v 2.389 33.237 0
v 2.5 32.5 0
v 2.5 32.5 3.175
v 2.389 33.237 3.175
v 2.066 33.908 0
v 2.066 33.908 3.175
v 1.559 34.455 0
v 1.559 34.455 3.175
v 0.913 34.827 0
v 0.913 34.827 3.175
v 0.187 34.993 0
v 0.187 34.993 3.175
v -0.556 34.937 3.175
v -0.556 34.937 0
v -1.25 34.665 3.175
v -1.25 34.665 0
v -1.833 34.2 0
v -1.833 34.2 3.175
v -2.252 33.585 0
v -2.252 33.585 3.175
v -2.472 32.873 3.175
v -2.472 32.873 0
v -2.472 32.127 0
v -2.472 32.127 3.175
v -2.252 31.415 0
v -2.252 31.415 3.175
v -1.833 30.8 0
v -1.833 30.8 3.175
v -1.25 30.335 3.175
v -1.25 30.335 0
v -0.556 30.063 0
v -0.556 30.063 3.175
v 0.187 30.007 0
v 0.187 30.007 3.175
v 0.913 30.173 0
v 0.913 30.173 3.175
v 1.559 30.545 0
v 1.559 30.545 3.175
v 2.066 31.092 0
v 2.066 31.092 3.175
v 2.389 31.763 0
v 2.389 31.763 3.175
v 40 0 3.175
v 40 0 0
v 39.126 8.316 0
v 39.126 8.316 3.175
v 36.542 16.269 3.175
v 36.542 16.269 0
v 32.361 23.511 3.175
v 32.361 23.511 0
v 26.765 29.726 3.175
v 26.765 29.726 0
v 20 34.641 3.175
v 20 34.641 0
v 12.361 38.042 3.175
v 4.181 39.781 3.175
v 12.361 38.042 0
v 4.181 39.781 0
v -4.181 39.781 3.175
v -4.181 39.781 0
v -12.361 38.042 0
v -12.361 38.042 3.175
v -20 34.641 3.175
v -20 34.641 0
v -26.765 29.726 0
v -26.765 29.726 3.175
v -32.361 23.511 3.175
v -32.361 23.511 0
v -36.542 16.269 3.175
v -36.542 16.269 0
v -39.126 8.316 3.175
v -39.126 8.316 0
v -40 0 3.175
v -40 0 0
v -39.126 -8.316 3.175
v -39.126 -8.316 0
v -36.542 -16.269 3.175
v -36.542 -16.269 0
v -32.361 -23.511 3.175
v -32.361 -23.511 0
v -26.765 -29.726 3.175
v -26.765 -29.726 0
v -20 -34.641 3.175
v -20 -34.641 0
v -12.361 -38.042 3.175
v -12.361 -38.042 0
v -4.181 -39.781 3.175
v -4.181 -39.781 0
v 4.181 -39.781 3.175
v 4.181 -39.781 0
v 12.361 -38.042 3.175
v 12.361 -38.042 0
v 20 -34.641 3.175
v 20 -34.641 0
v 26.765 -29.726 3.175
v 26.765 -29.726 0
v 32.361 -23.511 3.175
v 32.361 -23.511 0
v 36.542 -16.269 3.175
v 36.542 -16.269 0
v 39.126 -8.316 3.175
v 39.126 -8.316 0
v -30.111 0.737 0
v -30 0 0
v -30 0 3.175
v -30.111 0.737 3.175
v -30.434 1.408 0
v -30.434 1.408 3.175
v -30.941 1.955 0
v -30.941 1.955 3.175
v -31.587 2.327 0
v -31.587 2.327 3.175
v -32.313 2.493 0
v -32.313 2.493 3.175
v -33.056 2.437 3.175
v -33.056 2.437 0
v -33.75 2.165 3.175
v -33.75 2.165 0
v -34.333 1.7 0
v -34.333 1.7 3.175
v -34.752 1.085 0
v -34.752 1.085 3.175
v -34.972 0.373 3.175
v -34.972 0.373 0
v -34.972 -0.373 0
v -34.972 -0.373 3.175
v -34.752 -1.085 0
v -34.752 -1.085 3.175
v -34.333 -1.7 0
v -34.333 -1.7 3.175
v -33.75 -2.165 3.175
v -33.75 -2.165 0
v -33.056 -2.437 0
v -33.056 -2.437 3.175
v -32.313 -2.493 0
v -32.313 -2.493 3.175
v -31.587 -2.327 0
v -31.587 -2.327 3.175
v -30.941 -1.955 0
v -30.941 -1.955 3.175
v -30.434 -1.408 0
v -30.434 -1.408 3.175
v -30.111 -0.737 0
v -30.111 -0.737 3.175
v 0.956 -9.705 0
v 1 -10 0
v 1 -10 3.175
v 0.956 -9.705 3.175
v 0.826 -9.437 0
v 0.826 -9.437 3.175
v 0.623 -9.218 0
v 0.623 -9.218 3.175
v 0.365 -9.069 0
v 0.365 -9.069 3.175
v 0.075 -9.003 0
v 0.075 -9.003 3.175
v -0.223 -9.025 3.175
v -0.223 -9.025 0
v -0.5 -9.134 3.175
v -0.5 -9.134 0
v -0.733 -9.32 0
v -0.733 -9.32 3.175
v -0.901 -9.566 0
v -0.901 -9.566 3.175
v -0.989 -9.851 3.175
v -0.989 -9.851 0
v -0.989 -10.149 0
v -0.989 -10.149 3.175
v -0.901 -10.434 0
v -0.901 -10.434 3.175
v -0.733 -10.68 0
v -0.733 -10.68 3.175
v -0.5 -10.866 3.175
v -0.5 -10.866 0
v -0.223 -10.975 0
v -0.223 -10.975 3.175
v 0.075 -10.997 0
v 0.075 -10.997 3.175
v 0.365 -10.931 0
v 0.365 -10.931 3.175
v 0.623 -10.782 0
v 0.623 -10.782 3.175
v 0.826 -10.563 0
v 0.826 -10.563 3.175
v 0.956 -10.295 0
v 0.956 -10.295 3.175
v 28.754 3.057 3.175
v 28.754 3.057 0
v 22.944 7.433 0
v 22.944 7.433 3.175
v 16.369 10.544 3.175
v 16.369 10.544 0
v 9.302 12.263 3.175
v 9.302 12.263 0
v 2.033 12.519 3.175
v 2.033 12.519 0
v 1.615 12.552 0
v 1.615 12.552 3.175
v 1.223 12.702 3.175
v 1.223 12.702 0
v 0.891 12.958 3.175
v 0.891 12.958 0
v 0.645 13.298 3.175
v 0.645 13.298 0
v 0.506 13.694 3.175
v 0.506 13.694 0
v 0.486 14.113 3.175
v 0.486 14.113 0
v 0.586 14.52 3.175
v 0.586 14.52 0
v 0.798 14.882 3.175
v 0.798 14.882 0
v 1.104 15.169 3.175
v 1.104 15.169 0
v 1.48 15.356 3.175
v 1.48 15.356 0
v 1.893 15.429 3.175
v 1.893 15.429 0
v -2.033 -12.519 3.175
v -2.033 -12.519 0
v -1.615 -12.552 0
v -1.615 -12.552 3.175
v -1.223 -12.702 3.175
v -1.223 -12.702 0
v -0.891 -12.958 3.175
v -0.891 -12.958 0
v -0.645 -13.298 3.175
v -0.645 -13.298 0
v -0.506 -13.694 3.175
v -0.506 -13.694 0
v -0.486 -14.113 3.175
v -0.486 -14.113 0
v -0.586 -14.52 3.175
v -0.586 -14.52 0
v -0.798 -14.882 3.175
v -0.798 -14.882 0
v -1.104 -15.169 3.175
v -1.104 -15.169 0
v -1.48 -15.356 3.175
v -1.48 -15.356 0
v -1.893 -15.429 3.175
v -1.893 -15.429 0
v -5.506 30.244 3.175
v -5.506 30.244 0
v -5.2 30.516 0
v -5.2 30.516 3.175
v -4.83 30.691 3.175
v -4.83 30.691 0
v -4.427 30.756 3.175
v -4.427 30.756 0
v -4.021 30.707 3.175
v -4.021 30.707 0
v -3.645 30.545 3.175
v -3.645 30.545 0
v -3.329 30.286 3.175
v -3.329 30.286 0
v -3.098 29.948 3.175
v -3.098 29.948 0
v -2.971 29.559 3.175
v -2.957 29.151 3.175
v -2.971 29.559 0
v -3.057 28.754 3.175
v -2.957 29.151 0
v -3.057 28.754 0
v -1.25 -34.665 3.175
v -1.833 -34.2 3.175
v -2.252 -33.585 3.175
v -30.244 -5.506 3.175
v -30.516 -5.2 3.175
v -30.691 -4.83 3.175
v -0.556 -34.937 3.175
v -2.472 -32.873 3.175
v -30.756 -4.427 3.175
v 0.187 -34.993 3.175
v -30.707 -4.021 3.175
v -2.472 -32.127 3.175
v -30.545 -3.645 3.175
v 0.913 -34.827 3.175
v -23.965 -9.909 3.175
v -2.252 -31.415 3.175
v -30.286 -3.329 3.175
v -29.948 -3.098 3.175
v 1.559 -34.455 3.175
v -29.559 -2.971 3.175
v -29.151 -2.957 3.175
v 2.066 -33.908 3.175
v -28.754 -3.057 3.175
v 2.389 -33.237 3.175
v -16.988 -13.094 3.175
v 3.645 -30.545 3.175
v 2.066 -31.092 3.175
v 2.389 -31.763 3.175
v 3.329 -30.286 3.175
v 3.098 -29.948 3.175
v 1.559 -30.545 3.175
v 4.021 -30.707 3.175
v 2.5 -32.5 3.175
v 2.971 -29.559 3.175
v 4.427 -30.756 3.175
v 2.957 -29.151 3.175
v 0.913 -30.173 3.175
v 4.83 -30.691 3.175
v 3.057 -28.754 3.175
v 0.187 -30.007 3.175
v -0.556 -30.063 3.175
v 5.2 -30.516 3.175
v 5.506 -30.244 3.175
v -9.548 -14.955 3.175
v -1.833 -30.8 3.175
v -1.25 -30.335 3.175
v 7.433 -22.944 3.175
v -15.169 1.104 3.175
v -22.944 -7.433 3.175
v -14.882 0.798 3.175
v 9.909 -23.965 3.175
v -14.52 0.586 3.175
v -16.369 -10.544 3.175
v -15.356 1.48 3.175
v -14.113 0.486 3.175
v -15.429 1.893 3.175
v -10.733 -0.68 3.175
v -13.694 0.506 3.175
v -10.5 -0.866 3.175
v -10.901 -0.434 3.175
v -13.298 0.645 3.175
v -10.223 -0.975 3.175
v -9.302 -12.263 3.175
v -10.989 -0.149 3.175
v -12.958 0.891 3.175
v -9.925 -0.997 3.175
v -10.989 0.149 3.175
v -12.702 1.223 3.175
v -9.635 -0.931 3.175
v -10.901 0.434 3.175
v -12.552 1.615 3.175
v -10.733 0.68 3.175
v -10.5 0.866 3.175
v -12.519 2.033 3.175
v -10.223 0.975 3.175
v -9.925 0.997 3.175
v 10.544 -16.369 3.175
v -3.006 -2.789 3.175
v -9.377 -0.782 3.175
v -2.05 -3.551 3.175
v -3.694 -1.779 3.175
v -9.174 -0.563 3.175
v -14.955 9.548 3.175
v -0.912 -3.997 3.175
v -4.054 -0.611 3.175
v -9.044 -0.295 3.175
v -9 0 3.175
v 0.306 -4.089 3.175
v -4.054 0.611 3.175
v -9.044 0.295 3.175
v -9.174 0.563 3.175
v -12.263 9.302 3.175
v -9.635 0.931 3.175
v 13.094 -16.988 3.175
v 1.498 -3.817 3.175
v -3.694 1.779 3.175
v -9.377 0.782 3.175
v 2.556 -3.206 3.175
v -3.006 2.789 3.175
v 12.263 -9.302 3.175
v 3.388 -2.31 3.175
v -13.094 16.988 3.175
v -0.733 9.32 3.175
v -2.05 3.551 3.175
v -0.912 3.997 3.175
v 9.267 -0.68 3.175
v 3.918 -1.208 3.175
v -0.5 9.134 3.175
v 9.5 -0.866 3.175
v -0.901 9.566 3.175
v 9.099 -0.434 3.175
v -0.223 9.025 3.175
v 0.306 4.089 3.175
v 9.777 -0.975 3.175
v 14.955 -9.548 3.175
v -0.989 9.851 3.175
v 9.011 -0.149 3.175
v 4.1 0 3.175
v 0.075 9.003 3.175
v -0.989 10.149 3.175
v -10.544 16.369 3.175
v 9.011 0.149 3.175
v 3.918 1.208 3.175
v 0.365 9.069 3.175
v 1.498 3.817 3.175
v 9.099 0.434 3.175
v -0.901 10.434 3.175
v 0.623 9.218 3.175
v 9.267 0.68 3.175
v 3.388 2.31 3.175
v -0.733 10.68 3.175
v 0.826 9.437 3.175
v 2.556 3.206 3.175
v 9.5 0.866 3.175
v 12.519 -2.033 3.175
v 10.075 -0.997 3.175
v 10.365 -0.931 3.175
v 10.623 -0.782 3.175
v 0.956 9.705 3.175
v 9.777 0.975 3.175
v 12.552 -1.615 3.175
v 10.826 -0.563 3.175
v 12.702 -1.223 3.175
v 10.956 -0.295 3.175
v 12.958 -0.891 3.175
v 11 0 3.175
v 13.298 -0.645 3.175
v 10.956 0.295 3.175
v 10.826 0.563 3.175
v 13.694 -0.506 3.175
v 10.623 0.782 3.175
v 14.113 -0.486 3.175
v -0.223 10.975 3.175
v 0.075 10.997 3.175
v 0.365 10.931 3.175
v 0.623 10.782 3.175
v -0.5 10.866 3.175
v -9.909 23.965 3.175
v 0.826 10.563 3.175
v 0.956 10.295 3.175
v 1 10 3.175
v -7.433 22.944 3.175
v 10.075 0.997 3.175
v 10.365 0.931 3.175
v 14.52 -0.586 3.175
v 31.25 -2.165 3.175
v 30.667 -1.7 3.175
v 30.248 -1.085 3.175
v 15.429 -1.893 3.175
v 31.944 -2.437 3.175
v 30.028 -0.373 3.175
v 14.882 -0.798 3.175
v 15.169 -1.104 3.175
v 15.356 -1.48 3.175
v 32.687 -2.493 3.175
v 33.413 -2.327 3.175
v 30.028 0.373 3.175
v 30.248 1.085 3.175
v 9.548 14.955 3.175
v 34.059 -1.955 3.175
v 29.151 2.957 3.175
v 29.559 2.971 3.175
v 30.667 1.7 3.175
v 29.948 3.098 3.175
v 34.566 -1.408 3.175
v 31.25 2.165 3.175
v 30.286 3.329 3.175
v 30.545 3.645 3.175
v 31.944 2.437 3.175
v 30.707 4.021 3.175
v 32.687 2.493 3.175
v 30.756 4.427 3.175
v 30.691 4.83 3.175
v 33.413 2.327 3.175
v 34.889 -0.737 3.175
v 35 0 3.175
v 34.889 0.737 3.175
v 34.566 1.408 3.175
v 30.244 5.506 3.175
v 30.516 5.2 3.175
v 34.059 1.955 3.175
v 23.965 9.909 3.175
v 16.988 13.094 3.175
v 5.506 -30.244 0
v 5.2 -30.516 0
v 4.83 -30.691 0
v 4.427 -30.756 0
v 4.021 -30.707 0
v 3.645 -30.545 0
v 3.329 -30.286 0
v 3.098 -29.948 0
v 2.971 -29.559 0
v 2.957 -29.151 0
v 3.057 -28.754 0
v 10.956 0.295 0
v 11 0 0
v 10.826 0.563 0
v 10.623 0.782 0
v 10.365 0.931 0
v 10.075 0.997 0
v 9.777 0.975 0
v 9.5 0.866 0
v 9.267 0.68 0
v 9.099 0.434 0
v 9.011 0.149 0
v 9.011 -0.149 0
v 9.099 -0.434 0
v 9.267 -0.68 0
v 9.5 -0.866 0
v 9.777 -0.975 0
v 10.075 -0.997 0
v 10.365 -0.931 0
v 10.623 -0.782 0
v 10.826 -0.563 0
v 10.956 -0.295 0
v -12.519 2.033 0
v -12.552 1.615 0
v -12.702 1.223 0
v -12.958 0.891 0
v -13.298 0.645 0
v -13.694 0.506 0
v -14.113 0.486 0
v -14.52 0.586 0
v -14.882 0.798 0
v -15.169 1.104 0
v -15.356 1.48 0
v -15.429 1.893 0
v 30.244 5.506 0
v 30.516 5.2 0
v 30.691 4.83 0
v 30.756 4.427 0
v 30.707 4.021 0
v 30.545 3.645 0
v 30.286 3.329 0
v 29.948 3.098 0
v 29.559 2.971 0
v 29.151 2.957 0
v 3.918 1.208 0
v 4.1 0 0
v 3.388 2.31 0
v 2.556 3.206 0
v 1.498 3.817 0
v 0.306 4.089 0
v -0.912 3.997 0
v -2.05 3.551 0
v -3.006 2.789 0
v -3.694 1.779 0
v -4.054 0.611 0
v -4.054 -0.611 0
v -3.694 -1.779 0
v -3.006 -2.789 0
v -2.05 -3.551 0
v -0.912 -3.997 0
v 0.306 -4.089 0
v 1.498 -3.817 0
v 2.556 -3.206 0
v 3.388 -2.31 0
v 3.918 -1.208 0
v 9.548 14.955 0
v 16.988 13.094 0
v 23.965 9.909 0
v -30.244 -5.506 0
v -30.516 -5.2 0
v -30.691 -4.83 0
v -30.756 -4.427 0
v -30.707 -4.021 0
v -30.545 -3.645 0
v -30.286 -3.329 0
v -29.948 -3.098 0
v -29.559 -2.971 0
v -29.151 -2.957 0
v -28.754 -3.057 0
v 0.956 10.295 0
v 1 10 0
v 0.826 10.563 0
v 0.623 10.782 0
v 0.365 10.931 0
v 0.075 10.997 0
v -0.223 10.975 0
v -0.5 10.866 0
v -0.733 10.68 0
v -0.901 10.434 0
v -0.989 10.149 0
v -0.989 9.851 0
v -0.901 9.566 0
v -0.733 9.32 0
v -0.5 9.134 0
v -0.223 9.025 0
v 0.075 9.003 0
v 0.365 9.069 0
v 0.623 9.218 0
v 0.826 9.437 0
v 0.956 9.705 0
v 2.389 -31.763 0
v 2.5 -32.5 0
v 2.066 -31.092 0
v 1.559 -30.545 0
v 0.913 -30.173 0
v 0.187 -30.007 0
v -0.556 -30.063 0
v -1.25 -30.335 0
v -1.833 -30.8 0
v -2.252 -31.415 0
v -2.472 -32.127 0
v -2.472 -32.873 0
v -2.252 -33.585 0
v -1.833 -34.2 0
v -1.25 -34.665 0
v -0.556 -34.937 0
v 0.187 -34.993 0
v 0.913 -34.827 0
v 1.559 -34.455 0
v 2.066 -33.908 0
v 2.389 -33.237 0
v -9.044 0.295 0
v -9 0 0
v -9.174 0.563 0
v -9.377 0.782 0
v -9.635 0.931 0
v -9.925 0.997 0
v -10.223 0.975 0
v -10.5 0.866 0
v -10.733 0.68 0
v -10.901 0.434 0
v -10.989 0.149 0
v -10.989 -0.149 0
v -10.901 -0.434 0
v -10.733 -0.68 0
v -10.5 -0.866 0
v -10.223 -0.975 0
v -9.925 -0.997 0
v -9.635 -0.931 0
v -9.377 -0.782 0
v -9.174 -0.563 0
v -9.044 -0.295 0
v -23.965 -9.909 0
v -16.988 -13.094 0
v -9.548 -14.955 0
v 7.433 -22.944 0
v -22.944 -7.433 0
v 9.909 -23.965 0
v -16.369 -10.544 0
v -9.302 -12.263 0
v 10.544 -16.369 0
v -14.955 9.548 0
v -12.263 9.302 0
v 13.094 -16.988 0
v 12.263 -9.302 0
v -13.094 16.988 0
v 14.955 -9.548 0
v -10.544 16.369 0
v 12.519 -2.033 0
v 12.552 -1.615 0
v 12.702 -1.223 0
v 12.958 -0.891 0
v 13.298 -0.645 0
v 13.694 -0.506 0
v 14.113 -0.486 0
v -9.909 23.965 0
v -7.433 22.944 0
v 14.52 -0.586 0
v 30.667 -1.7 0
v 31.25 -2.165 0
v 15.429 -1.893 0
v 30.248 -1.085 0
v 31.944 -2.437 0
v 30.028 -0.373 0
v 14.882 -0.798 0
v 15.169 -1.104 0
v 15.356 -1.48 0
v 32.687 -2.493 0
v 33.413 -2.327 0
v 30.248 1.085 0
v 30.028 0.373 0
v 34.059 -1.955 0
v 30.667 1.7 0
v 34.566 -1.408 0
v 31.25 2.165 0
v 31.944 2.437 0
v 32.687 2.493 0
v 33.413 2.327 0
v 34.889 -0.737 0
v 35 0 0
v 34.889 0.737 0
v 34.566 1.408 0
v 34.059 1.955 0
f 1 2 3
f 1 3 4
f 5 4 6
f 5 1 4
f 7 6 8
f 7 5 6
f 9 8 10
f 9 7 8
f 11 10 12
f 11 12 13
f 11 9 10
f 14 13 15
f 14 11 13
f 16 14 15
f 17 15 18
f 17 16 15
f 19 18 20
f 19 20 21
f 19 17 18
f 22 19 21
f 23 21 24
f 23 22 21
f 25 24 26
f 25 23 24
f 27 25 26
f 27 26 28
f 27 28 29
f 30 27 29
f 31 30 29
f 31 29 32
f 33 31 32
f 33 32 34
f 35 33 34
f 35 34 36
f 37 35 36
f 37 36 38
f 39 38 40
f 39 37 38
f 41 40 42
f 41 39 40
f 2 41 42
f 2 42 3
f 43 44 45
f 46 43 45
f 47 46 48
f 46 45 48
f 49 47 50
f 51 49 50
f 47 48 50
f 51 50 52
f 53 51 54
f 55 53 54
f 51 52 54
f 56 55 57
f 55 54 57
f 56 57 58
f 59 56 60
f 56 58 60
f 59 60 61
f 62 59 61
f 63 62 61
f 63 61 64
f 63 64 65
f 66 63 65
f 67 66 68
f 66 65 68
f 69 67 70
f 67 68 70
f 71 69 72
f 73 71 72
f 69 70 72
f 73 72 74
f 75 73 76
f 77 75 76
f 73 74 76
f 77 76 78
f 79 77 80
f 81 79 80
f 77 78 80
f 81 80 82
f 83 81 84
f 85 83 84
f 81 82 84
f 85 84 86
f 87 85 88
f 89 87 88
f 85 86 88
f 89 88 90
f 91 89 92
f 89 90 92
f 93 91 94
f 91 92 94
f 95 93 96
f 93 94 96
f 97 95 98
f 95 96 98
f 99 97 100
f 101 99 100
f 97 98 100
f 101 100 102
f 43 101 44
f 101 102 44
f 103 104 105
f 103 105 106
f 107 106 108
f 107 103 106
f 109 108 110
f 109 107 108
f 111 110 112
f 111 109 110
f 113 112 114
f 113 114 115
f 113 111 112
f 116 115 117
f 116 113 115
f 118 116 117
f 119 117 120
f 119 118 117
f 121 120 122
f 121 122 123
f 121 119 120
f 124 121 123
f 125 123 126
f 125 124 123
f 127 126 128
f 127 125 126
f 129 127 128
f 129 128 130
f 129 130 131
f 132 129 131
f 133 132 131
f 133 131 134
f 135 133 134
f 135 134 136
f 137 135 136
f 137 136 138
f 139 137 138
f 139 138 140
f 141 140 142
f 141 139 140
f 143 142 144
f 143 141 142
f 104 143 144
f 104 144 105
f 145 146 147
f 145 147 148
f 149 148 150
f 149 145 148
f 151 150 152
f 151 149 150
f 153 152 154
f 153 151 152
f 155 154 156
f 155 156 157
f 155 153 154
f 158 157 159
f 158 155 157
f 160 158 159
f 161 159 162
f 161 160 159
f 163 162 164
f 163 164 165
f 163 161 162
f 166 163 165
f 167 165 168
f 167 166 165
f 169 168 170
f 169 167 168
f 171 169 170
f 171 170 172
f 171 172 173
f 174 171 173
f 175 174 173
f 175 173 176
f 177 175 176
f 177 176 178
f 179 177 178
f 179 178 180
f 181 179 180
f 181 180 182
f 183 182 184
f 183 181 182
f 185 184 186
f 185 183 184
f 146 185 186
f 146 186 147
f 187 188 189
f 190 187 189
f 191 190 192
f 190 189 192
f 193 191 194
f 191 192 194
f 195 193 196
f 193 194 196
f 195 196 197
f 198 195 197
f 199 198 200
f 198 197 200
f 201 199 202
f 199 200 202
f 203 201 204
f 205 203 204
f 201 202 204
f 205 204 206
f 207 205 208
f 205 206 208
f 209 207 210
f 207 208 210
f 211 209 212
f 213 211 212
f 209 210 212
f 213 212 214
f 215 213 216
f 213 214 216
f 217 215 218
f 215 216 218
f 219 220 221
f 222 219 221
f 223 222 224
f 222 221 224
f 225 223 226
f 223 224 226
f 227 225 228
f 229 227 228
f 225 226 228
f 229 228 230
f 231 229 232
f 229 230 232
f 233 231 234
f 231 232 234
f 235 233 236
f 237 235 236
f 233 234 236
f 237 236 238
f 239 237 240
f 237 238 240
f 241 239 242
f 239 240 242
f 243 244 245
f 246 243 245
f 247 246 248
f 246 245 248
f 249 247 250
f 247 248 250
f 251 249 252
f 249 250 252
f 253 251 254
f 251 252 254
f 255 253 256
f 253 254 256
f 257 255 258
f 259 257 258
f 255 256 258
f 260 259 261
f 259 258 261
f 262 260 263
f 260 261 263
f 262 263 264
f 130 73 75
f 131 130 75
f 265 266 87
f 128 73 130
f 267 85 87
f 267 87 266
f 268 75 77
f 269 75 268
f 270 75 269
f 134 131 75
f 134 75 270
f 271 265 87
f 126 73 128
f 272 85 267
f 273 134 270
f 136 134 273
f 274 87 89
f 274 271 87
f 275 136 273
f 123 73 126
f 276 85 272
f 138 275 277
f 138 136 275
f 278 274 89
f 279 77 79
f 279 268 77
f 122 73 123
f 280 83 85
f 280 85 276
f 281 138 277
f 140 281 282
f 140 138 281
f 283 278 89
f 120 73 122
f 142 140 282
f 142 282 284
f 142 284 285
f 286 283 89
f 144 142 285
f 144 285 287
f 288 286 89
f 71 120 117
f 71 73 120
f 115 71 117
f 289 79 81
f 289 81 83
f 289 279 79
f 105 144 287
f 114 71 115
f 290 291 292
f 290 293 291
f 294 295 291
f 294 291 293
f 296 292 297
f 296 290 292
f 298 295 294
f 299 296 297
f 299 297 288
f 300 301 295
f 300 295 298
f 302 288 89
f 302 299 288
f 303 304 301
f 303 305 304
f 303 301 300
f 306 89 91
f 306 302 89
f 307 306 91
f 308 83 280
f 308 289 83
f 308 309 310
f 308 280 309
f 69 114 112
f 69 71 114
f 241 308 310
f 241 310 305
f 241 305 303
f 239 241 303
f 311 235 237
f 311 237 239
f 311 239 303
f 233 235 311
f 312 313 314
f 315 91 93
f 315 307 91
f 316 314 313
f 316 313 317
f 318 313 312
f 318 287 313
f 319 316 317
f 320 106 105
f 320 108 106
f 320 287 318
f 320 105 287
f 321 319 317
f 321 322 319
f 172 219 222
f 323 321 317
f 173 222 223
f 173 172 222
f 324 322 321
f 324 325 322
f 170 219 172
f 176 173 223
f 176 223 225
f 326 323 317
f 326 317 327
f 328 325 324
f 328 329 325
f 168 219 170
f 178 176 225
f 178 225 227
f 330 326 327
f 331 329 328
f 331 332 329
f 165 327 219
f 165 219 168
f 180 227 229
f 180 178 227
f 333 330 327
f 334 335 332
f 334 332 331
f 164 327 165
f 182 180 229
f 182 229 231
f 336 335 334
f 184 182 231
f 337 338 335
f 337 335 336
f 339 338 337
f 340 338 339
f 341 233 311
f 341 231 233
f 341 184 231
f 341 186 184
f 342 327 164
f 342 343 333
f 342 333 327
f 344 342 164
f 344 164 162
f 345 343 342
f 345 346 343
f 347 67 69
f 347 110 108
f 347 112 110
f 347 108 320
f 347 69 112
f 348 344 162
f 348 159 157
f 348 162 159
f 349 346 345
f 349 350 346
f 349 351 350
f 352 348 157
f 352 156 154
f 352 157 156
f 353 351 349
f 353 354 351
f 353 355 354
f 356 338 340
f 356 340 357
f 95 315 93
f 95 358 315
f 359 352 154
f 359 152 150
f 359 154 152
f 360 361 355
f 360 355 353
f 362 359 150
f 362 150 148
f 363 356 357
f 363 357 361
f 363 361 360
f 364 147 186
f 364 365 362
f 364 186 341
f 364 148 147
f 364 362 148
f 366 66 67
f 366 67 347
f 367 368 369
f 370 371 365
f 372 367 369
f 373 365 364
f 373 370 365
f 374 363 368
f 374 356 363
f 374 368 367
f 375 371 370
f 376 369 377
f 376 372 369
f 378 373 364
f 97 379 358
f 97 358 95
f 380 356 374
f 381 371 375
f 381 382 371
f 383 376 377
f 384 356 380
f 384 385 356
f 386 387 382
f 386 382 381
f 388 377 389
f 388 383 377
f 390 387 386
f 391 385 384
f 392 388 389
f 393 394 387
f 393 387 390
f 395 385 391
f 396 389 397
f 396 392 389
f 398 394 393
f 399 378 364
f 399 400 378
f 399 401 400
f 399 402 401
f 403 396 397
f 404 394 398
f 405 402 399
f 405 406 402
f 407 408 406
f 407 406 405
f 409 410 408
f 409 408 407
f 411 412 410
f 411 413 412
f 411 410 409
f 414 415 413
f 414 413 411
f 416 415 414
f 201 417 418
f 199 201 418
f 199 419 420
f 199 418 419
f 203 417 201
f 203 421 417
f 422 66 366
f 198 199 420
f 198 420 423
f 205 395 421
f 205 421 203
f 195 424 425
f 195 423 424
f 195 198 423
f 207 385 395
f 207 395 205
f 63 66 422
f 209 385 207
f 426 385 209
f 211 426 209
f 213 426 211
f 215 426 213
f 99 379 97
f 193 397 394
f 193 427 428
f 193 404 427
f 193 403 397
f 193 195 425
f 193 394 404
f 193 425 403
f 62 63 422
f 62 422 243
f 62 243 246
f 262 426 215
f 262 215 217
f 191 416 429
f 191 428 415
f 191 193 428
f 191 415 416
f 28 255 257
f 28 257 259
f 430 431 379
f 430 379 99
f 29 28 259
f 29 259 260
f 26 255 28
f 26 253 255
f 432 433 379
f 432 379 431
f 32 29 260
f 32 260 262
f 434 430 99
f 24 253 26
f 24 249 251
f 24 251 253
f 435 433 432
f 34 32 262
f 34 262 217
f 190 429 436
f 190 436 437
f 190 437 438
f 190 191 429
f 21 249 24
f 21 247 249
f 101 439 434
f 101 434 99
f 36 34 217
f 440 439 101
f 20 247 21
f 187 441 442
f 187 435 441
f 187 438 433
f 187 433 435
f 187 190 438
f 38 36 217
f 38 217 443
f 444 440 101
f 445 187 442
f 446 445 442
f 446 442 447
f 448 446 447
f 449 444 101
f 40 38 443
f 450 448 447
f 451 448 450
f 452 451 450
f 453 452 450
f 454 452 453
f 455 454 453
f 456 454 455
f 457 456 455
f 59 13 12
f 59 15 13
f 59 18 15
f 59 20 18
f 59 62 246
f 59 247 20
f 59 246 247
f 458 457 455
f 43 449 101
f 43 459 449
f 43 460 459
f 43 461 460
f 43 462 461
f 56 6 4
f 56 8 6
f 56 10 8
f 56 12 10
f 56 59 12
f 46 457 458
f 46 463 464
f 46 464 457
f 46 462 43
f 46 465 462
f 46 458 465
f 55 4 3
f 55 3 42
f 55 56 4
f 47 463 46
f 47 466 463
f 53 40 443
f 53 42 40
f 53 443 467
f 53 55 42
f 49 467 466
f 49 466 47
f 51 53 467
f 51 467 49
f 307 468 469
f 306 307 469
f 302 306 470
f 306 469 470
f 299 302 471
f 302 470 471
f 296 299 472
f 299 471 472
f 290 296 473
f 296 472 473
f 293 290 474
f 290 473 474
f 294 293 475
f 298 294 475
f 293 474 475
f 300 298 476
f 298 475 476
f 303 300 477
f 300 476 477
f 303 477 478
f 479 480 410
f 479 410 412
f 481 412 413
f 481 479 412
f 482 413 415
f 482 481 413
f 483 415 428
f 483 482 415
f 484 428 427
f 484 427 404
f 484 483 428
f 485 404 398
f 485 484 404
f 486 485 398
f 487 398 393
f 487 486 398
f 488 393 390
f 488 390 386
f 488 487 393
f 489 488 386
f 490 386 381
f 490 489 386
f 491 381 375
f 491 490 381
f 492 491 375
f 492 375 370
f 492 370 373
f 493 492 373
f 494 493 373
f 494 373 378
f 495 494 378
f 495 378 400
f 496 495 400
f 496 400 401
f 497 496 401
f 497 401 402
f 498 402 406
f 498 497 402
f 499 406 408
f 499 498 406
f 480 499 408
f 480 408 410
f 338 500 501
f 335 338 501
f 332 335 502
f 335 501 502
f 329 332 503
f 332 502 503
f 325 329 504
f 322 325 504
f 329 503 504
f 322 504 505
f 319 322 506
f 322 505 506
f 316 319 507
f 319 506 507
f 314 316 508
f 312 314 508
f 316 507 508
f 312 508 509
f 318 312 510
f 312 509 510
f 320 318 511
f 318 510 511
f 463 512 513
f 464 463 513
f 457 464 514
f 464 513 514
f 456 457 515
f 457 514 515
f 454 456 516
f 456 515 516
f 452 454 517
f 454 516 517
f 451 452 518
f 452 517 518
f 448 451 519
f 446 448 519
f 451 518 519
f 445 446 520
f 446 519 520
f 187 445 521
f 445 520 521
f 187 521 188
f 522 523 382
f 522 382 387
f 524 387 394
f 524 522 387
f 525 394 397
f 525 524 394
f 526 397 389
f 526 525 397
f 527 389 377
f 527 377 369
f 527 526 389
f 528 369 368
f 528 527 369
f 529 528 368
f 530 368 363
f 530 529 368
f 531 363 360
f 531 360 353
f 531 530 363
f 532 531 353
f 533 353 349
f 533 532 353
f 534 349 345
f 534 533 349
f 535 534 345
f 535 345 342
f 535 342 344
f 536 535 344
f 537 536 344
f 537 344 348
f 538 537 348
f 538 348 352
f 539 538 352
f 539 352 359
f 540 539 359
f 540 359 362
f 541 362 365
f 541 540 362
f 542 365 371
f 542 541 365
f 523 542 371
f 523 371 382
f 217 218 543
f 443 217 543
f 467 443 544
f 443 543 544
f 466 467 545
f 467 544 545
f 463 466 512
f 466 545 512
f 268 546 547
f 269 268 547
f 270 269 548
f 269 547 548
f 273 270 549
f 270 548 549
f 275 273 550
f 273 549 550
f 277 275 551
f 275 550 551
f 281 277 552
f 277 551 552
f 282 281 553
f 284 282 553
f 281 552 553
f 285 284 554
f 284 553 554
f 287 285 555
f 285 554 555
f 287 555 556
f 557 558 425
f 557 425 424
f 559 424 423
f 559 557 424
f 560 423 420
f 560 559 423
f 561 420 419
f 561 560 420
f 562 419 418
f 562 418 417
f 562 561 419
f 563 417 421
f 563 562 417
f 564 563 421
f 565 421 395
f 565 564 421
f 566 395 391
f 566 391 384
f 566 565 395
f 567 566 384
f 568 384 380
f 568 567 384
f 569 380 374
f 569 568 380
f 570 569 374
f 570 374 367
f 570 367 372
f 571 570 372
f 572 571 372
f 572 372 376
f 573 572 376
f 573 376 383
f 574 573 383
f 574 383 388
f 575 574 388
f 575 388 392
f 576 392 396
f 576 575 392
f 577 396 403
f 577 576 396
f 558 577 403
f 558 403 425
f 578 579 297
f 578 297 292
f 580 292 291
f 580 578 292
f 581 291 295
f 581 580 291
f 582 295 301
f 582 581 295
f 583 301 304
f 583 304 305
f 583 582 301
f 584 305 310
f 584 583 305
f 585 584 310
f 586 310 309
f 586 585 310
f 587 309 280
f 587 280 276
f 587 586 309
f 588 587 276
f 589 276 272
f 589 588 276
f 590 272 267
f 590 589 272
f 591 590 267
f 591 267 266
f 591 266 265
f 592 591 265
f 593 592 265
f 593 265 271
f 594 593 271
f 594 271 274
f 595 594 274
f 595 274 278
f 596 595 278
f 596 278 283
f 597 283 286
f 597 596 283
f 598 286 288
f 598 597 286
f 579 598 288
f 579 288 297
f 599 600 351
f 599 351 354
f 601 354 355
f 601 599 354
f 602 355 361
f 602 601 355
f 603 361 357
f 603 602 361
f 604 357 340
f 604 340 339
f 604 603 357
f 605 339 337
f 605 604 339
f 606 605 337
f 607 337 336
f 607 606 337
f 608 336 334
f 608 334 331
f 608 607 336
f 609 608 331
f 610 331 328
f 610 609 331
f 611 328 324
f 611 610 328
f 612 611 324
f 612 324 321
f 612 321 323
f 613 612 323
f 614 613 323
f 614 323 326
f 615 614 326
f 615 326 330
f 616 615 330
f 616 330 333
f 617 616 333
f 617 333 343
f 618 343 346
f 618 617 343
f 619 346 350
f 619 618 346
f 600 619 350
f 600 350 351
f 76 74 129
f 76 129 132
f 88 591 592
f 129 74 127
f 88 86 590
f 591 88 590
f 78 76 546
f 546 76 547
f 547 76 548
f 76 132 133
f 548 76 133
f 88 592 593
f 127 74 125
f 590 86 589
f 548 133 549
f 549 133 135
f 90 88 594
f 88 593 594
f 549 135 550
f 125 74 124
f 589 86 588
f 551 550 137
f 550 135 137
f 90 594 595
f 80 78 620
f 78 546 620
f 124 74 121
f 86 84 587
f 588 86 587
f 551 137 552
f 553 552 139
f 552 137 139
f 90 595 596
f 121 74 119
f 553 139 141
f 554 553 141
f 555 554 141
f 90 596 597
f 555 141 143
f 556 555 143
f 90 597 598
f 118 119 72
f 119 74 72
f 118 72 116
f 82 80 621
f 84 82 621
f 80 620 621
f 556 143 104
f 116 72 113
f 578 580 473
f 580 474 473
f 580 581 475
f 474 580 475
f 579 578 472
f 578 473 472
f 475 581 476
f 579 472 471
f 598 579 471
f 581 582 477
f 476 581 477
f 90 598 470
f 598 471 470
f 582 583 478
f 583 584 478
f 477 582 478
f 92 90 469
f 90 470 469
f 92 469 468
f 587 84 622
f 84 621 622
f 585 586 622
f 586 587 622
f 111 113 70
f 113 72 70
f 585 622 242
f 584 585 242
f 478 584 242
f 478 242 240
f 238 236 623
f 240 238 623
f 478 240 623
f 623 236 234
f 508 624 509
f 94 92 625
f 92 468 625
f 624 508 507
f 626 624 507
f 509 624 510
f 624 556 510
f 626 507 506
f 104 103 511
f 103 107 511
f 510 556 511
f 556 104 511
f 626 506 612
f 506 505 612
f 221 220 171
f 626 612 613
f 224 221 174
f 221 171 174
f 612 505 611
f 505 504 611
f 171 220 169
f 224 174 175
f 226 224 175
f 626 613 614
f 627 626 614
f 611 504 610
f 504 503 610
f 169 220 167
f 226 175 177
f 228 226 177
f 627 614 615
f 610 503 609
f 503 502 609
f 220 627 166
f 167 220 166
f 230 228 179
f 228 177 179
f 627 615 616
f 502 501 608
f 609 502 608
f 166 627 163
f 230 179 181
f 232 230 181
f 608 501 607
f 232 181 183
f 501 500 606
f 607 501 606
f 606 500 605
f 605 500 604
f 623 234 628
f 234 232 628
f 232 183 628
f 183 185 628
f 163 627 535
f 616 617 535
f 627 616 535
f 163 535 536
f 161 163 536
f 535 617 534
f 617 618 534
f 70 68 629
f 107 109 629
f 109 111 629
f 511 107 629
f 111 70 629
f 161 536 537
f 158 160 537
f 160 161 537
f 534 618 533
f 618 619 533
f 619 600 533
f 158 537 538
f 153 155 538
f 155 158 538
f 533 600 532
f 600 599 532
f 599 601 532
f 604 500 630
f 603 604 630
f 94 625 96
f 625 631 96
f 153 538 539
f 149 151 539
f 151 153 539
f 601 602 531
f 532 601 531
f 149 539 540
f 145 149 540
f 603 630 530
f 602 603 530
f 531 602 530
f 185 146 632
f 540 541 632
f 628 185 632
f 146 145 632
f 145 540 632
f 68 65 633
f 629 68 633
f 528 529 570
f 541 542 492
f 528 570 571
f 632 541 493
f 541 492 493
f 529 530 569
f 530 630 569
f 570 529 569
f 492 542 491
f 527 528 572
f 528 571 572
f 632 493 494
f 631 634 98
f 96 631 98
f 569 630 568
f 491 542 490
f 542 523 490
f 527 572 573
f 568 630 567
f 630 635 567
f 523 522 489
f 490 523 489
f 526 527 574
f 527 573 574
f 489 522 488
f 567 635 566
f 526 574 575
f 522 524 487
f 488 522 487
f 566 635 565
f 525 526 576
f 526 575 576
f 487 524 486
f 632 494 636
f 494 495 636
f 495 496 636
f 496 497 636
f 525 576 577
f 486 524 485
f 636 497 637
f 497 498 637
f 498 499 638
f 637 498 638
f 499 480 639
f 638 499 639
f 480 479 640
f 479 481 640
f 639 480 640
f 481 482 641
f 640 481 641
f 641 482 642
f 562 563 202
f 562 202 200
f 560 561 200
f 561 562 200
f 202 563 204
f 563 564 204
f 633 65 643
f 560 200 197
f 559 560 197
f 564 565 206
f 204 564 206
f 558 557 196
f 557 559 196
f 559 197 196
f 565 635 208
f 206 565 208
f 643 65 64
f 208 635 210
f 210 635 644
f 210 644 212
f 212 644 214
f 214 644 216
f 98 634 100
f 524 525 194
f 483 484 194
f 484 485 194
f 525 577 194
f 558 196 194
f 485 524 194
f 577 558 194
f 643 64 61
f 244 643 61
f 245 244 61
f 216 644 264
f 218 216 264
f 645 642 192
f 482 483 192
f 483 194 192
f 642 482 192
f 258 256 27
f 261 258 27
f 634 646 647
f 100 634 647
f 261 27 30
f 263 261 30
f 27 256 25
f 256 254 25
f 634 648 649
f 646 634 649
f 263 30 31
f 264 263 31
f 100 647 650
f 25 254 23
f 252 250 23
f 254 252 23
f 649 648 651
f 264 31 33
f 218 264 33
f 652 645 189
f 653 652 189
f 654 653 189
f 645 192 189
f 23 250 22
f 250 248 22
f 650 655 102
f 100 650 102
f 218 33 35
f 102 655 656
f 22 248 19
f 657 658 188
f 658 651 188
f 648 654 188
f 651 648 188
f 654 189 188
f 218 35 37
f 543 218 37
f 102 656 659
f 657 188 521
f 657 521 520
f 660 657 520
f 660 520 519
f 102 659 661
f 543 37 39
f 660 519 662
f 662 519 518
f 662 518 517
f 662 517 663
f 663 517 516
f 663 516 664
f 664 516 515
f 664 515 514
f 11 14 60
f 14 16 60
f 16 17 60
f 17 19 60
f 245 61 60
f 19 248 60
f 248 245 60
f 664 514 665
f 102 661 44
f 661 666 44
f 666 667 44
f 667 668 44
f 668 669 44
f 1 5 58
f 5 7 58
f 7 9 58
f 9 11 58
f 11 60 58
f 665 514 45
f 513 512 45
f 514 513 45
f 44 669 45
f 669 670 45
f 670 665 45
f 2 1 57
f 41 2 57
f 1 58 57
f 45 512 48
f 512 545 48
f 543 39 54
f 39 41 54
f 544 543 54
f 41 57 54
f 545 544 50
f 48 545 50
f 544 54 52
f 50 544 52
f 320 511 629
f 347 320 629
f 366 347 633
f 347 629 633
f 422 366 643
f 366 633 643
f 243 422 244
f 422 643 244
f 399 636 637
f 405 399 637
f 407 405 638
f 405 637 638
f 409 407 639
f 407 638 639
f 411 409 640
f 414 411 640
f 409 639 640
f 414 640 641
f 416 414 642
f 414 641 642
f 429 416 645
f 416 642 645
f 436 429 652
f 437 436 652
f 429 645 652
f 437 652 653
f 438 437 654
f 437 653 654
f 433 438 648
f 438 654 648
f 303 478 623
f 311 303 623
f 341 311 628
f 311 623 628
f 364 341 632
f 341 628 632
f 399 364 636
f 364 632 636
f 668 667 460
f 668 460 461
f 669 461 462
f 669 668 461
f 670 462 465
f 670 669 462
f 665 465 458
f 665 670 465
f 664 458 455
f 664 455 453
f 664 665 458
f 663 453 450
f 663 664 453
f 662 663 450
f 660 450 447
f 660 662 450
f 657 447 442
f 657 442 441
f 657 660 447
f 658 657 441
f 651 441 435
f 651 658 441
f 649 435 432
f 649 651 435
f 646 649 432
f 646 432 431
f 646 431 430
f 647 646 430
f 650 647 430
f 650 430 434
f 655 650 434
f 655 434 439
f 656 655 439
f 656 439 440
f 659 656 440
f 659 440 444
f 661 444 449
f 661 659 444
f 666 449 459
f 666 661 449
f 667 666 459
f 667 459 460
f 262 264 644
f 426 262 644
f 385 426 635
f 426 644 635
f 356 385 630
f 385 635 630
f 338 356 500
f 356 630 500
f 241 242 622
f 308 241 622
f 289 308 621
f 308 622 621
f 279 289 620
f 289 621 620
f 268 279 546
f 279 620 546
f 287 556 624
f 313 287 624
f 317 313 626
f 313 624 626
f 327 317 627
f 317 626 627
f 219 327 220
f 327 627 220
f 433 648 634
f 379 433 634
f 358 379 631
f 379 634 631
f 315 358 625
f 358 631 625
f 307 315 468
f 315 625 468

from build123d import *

# Parameters (mm, degrees)
SKETCH1_R           = 40
SKETCH1_R_2         = 4.1
SKETCH1_R_3         = 1
SKETCH1_R_4         = 2.5
BOSS_EXTRUDE1_DEPTH = 3.175


with BuildPart() as part:
    # Sketch1 → Boss-Extrude1 (new body)
    with BuildSketch(Plane.XY):
        Circle(SKETCH1_R)
        Circle(SKETCH1_R_2, mode=Mode.SUBTRACT)
        with Locations((10, 0)):
            Circle(SKETCH1_R_3, mode=Mode.SUBTRACT)
        with Locations((0, -10)):
            Circle(SKETCH1_R_3, mode=Mode.SUBTRACT)
        with Locations((-10, 0)):
            Circle(SKETCH1_R_3, mode=Mode.SUBTRACT)
        with Locations((0, 10)):
            Circle(SKETCH1_R_3, mode=Mode.SUBTRACT)
        with Locations((0, 32.500000024)):
            Circle(SKETCH1_R_4, mode=Mode.SUBTRACT)
        with Locations((32.500000024, 0)):
            Circle(SKETCH1_R_4, mode=Mode.SUBTRACT)
        with Locations((0, -32.500000024)):
            Circle(SKETCH1_R_4, mode=Mode.SUBTRACT)
        with Locations((-32.500000024, 0)):
            Circle(SKETCH1_R_4, mode=Mode.SUBTRACT)
        with BuildLine():
            ThreePointArc((1.892882879, 15.429065651), (16.987986018, 13.094493375), (30.244053834, 5.505749571))
            ThreePointArc((30.244053834, 5.505749571), (30.545302534, 3.644891179), (28.754168977, 3.057196265))
            ThreePointArc((28.754168977, 3.057196265), (16.369486394, 10.54396404), (2.033129259, 12.519038334))
            ThreePointArc((2.033129259, 12.519038334), (0.481040246, 13.902629865), (1.892882879, 15.429065651))
        make_face(mode=Mode.SUBTRACT)
        with BuildLine():
            ThreePointArc((15.429065651, -1.892882879), (13.094493375, -16.987986018), (5.505749571, -30.244053834))
            ThreePointArc((5.505749571, -30.244053834), (3.644891179, -30.545302534), (3.057196265, -28.754168977))
            ThreePointArc((3.057196265, -28.754168977), (10.54396404, -16.369486394), (12.519038334, -2.033129259))
            ThreePointArc((12.519038334, -2.033129259), (13.902629865, -0.481040246), (15.429065651, -1.892882879))
        make_face(mode=Mode.SUBTRACT)
        with BuildLine():
            ThreePointArc((-1.892882879, -15.429065651), (-16.987986018, -13.094493375), (-30.244053834, -5.505749571))
            ThreePointArc((-30.244053834, -5.505749571), (-30.545302534, -3.644891179), (-28.754168977, -3.057196265))
            ThreePointArc((-28.754168977, -3.057196265), (-16.369486394, -10.54396404), (-2.033129259, -12.519038334))
            ThreePointArc((-2.033129259, -12.519038334), (-0.481040246, -13.902629865), (-1.892882879, -15.429065651))
        make_face(mode=Mode.SUBTRACT)
        with BuildLine():
            ThreePointArc((-15.429065651, 1.892882879), (-13.094493375, 16.987986018), (-5.505749571, 30.244053834))
            ThreePointArc((-5.505749571, 30.244053834), (-3.644891179, 30.545302534), (-3.057196265, 28.754168977))
            ThreePointArc((-3.057196265, 28.754168977), (-10.54396404, 16.369486394), (-12.519038334, 2.033129259))
            ThreePointArc((-12.519038334, 2.033129259), (-13.902629865, 0.481040246), (-15.429065651, 1.892882879))
        make_face(mode=Mode.SUBTRACT)
    extrude(amount=BOSS_EXTRUDE1_DEPTH)


solid = part.part
